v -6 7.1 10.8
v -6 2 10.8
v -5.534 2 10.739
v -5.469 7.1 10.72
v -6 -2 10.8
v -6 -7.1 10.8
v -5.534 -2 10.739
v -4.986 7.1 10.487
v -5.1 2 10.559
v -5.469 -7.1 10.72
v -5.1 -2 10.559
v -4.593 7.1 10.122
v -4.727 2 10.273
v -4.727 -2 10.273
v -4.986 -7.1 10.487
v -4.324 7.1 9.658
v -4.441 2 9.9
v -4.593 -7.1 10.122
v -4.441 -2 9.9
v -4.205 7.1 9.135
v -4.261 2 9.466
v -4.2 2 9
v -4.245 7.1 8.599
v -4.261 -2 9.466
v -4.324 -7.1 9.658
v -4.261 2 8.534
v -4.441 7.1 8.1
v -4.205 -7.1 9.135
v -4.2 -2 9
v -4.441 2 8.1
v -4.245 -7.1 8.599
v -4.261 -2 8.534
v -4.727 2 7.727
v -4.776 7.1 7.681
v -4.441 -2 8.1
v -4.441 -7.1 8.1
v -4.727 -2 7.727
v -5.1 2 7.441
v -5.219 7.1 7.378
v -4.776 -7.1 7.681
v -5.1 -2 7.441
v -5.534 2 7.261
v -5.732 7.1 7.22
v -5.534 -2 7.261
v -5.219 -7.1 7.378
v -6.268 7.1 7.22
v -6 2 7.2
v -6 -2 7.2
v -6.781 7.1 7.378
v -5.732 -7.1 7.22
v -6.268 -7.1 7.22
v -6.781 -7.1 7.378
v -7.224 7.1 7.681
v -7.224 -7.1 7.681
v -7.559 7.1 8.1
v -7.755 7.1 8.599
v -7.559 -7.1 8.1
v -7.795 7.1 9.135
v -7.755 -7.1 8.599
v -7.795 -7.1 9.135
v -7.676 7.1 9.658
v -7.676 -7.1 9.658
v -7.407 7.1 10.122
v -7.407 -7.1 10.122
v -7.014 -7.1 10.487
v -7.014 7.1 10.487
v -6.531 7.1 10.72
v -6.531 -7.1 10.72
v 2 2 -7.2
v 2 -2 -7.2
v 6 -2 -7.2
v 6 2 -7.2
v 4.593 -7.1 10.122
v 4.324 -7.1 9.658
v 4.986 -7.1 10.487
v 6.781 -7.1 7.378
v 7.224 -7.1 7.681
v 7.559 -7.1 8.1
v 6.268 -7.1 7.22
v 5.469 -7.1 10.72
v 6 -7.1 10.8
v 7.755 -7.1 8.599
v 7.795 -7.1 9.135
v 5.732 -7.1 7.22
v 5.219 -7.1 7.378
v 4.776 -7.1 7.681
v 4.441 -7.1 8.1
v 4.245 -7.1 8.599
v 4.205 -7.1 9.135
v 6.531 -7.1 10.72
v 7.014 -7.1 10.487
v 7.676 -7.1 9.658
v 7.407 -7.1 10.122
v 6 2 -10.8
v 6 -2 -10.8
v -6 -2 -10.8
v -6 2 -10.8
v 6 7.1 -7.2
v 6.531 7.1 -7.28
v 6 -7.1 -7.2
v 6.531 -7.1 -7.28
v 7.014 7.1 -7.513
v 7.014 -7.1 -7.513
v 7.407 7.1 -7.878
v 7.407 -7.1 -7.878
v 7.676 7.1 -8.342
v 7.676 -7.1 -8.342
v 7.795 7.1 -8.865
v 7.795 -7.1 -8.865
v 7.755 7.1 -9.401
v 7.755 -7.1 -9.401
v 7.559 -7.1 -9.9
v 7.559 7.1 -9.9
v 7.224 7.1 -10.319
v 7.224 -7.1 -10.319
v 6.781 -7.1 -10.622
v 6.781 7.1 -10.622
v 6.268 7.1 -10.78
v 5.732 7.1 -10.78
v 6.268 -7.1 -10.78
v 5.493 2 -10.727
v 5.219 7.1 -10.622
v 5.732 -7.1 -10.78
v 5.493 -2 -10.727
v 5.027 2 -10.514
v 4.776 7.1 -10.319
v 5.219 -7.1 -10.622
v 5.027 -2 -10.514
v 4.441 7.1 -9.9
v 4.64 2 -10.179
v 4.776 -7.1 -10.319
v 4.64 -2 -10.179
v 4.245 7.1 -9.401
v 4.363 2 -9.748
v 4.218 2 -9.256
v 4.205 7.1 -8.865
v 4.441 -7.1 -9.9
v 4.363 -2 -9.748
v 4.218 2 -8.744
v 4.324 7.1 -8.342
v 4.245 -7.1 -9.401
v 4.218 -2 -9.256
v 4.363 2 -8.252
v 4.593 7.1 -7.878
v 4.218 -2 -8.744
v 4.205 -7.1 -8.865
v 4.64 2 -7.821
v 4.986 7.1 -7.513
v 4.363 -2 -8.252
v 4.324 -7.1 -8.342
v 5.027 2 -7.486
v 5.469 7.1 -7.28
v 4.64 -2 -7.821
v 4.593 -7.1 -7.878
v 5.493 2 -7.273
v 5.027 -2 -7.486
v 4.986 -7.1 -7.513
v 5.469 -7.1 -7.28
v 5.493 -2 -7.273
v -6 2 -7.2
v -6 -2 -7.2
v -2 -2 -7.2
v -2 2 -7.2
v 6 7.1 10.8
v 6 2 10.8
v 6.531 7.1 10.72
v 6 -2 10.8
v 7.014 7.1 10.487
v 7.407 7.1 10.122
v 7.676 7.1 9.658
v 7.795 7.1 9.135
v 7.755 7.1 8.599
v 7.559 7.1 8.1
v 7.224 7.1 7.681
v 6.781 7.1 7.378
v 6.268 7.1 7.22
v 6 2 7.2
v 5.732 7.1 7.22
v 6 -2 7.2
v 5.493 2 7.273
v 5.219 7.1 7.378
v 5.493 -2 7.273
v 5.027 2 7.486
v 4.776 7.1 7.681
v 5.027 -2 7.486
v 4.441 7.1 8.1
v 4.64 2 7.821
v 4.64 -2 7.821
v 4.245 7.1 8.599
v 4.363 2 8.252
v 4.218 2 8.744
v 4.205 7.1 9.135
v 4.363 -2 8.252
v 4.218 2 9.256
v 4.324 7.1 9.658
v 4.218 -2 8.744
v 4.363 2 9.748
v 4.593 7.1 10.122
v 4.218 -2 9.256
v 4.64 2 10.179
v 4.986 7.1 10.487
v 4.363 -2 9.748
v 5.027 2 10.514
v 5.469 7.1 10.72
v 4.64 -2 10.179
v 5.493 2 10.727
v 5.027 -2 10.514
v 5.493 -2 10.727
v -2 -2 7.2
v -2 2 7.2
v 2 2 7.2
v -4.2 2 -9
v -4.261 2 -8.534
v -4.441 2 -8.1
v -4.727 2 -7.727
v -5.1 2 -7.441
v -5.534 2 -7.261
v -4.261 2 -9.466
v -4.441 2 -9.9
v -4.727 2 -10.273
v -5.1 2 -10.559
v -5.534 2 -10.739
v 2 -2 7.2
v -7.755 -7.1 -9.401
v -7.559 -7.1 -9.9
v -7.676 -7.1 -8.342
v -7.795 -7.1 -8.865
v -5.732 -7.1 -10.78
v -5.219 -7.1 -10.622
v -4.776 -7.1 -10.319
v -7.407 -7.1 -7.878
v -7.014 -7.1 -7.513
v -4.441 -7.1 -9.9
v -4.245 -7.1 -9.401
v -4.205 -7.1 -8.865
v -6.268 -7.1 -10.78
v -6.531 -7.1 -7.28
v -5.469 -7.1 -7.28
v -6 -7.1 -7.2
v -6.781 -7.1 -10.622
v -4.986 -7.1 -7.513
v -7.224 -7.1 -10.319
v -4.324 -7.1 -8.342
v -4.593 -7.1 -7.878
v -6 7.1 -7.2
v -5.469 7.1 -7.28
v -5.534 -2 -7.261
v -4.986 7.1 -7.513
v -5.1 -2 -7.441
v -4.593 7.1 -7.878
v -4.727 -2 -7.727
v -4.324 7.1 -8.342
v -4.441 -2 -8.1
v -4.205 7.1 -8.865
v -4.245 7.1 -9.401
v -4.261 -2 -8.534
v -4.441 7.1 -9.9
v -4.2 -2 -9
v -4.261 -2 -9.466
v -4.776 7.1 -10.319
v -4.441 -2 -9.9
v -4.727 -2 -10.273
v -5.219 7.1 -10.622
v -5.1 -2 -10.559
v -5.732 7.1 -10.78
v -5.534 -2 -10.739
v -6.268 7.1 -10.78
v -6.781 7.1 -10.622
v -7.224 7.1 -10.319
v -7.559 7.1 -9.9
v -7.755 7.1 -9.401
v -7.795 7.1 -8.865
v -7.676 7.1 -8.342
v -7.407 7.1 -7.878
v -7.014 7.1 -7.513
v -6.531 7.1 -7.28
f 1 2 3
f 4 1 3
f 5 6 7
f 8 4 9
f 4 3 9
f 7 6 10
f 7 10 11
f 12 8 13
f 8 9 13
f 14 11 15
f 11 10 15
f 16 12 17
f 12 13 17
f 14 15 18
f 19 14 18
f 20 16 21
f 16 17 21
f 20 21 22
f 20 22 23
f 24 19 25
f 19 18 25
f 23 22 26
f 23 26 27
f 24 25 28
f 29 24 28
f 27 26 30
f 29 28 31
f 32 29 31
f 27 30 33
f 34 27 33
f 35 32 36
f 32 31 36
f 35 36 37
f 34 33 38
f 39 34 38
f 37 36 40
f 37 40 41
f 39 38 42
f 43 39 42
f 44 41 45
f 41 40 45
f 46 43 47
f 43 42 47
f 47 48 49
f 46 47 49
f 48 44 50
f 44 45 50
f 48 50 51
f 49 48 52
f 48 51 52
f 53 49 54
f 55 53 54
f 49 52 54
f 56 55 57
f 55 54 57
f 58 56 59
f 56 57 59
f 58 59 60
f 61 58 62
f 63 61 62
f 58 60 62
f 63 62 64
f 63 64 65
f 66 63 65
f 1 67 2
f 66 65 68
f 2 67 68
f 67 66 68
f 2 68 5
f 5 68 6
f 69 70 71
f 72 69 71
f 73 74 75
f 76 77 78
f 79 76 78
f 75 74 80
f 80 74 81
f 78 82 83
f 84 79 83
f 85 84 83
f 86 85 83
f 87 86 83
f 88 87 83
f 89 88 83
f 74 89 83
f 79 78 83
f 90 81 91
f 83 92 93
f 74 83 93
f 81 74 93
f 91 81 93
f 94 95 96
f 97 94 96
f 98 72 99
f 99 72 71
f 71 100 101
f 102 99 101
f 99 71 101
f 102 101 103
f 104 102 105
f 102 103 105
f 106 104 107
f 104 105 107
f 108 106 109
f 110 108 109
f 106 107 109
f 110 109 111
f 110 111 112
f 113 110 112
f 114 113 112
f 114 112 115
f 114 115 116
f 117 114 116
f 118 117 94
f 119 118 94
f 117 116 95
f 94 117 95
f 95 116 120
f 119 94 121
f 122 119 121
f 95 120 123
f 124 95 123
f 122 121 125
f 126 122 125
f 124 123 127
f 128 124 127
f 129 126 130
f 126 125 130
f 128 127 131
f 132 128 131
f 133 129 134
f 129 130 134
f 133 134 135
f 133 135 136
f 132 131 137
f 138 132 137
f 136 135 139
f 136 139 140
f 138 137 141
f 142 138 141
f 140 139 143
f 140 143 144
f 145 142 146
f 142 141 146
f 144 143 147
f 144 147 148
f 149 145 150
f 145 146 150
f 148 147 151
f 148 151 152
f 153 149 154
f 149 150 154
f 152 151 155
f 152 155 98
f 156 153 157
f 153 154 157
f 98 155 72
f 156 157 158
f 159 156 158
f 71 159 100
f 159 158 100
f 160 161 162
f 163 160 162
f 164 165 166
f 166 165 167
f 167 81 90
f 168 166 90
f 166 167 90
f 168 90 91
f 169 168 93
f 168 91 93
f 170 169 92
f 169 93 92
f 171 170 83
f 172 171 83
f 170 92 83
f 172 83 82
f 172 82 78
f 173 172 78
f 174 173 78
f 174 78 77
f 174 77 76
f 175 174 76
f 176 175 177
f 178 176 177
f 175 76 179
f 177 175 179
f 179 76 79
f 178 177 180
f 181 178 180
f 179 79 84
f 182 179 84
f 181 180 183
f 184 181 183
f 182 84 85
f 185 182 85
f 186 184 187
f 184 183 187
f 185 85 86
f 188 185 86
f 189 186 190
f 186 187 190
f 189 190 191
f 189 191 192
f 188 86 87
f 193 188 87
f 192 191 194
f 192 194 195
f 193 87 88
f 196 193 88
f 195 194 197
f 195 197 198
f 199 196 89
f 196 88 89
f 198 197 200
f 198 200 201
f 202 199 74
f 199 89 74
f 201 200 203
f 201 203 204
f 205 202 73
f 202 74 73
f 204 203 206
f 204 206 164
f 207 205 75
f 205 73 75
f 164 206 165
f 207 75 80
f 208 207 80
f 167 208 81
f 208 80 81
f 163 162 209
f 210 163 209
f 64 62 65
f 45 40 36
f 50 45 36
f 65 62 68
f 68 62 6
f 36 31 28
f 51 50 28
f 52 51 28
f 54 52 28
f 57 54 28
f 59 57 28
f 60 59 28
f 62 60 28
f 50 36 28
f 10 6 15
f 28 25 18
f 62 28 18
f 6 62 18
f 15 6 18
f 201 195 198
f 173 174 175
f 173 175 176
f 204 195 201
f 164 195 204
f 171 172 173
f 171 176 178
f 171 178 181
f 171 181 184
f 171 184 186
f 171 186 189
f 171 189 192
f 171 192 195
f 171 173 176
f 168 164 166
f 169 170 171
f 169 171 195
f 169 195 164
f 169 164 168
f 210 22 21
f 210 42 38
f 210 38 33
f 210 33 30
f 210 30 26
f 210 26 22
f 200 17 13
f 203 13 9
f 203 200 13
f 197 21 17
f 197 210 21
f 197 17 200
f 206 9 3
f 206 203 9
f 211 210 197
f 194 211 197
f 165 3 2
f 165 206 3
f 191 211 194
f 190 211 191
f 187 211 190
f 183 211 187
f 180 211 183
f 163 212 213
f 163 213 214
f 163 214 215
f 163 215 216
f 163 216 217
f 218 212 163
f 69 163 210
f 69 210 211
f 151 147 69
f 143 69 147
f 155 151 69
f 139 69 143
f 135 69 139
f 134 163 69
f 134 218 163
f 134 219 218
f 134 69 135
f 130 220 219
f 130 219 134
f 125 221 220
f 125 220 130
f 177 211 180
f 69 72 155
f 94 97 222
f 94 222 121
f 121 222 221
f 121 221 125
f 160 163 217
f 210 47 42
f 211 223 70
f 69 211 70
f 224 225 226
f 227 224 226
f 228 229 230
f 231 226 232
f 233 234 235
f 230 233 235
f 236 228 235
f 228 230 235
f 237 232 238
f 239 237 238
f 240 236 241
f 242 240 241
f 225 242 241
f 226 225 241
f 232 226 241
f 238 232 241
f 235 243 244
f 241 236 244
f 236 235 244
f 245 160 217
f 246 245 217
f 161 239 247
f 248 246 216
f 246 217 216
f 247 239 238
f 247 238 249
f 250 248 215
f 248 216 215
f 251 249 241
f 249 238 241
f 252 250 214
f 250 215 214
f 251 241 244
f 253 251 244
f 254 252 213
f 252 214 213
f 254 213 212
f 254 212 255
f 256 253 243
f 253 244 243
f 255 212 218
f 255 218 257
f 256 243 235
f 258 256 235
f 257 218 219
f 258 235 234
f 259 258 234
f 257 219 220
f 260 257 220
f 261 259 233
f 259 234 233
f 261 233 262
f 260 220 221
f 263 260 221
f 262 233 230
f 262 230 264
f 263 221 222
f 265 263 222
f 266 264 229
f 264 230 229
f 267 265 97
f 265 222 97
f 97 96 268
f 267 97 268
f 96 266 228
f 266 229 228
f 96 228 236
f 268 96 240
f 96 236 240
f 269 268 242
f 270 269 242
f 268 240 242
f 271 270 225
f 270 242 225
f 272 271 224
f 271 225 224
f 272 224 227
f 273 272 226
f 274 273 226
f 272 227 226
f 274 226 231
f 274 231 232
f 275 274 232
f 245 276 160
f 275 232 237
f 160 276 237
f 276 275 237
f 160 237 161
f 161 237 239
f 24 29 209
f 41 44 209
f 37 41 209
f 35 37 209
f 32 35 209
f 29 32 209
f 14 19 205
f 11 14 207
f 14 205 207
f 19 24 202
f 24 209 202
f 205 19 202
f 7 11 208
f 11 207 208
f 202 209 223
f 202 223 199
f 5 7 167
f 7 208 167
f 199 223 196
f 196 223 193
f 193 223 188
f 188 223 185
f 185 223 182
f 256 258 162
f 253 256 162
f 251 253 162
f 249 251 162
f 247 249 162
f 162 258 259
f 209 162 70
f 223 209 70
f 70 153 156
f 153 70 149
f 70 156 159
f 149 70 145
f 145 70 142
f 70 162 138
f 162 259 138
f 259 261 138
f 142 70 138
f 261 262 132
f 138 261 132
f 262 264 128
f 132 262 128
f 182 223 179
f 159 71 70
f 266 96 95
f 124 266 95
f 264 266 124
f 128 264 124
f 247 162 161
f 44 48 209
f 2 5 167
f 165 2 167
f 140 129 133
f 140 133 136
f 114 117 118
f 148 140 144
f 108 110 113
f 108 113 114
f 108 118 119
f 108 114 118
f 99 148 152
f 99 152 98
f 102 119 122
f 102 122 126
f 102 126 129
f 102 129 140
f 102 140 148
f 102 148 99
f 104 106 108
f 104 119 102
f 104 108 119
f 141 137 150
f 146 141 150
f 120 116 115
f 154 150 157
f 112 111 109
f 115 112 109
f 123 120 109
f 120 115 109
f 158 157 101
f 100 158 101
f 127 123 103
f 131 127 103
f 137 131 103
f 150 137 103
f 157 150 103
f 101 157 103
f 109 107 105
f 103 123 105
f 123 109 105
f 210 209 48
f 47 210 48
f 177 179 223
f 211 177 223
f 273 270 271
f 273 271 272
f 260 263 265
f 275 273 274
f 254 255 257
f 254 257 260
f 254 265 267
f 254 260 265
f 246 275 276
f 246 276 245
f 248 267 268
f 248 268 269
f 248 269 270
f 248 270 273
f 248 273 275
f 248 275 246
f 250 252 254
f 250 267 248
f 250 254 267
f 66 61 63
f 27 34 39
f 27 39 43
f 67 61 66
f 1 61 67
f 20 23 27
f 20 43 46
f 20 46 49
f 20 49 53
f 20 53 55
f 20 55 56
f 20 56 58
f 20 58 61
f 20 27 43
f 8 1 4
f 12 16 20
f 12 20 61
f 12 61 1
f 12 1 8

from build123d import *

# Parameters (mm, degrees)
BOSS_EXTRUDE1_DEPTH      = 2
BOSS_EXTRUDE1_DEPTH_BACK = 2
BOSS_EXTRUDE2_DEPTH      = 7.1
BOSS_EXTRUDE2_DEPTH_BACK = 7.1
SKETCH1_4_R              = 1.8


with BuildPart() as part:
    # Sketch1 → Boss-Extrude1 (new, two sides: drawn at the far end of the back side and taken through both)
    with BuildSketch(Plane(origin=(0, 0, 0), x_dir=(1, 0, 0), z_dir=(0, 1, 0)).offset(-BOSS_EXTRUDE1_DEPTH_BACK)):
        with BuildLine():
            ThreePointArc((-4.2, -9), (-4.727207794, -10.272792206), (-6, -10.8))
            Line((-6, -10.8), (6, -10.8))
            ThreePointArc((6, -10.8), (4.2, -9), (6, -7.2))
            Line((6, -7.2), (2, -7.2))
            Line((2, -7.2), (2, 7.2))
            Line((2, 7.2), (6, 7.2))
            ThreePointArc((6, 7.2), (4.2, 9), (6, 10.8))
            Line((6, 10.8), (-6, 10.8))
            ThreePointArc((-6, 10.8), (-4.727207794, 10.272792206), (-4.2, 9))
            ThreePointArc((-4.2, 9), (-4.727207794, 7.727207794), (-6, 7.2))
            Line((-6, 7.2), (-2, 7.2))
            Line((-2, 7.2), (-2, -7.2))
            Line((-2, -7.2), (-6, -7.2))
            ThreePointArc((-6, -7.2), (-4.727207794, -7.727207794), (-4.2, -9))
        make_face()
    extrude(amount=BOSS_EXTRUDE1_DEPTH + BOSS_EXTRUDE1_DEPTH_BACK)

    # Sketch1<4> → Boss-Extrude2 (add, two sides: drawn at the far end of the back side and taken through both)
    with BuildSketch(Plane(origin=(0, 0, 0), x_dir=(1, 0, 0), z_dir=(0, 1, 0)).offset(-BOSS_EXTRUDE2_DEPTH_BACK)):
        with Locations((-6, -9)):
            Circle(SKETCH1_4_R)
        with Locations((6, -9)):
            Circle(SKETCH1_4_R)
        with Locations((-6, 9)):
            Circle(SKETCH1_4_R)
        with Locations((6, 9)):
            Circle(SKETCH1_4_R)
    extrude(amount=BOSS_EXTRUDE2_DEPTH + BOSS_EXTRUDE2_DEPTH_BACK)


solid = part.part
